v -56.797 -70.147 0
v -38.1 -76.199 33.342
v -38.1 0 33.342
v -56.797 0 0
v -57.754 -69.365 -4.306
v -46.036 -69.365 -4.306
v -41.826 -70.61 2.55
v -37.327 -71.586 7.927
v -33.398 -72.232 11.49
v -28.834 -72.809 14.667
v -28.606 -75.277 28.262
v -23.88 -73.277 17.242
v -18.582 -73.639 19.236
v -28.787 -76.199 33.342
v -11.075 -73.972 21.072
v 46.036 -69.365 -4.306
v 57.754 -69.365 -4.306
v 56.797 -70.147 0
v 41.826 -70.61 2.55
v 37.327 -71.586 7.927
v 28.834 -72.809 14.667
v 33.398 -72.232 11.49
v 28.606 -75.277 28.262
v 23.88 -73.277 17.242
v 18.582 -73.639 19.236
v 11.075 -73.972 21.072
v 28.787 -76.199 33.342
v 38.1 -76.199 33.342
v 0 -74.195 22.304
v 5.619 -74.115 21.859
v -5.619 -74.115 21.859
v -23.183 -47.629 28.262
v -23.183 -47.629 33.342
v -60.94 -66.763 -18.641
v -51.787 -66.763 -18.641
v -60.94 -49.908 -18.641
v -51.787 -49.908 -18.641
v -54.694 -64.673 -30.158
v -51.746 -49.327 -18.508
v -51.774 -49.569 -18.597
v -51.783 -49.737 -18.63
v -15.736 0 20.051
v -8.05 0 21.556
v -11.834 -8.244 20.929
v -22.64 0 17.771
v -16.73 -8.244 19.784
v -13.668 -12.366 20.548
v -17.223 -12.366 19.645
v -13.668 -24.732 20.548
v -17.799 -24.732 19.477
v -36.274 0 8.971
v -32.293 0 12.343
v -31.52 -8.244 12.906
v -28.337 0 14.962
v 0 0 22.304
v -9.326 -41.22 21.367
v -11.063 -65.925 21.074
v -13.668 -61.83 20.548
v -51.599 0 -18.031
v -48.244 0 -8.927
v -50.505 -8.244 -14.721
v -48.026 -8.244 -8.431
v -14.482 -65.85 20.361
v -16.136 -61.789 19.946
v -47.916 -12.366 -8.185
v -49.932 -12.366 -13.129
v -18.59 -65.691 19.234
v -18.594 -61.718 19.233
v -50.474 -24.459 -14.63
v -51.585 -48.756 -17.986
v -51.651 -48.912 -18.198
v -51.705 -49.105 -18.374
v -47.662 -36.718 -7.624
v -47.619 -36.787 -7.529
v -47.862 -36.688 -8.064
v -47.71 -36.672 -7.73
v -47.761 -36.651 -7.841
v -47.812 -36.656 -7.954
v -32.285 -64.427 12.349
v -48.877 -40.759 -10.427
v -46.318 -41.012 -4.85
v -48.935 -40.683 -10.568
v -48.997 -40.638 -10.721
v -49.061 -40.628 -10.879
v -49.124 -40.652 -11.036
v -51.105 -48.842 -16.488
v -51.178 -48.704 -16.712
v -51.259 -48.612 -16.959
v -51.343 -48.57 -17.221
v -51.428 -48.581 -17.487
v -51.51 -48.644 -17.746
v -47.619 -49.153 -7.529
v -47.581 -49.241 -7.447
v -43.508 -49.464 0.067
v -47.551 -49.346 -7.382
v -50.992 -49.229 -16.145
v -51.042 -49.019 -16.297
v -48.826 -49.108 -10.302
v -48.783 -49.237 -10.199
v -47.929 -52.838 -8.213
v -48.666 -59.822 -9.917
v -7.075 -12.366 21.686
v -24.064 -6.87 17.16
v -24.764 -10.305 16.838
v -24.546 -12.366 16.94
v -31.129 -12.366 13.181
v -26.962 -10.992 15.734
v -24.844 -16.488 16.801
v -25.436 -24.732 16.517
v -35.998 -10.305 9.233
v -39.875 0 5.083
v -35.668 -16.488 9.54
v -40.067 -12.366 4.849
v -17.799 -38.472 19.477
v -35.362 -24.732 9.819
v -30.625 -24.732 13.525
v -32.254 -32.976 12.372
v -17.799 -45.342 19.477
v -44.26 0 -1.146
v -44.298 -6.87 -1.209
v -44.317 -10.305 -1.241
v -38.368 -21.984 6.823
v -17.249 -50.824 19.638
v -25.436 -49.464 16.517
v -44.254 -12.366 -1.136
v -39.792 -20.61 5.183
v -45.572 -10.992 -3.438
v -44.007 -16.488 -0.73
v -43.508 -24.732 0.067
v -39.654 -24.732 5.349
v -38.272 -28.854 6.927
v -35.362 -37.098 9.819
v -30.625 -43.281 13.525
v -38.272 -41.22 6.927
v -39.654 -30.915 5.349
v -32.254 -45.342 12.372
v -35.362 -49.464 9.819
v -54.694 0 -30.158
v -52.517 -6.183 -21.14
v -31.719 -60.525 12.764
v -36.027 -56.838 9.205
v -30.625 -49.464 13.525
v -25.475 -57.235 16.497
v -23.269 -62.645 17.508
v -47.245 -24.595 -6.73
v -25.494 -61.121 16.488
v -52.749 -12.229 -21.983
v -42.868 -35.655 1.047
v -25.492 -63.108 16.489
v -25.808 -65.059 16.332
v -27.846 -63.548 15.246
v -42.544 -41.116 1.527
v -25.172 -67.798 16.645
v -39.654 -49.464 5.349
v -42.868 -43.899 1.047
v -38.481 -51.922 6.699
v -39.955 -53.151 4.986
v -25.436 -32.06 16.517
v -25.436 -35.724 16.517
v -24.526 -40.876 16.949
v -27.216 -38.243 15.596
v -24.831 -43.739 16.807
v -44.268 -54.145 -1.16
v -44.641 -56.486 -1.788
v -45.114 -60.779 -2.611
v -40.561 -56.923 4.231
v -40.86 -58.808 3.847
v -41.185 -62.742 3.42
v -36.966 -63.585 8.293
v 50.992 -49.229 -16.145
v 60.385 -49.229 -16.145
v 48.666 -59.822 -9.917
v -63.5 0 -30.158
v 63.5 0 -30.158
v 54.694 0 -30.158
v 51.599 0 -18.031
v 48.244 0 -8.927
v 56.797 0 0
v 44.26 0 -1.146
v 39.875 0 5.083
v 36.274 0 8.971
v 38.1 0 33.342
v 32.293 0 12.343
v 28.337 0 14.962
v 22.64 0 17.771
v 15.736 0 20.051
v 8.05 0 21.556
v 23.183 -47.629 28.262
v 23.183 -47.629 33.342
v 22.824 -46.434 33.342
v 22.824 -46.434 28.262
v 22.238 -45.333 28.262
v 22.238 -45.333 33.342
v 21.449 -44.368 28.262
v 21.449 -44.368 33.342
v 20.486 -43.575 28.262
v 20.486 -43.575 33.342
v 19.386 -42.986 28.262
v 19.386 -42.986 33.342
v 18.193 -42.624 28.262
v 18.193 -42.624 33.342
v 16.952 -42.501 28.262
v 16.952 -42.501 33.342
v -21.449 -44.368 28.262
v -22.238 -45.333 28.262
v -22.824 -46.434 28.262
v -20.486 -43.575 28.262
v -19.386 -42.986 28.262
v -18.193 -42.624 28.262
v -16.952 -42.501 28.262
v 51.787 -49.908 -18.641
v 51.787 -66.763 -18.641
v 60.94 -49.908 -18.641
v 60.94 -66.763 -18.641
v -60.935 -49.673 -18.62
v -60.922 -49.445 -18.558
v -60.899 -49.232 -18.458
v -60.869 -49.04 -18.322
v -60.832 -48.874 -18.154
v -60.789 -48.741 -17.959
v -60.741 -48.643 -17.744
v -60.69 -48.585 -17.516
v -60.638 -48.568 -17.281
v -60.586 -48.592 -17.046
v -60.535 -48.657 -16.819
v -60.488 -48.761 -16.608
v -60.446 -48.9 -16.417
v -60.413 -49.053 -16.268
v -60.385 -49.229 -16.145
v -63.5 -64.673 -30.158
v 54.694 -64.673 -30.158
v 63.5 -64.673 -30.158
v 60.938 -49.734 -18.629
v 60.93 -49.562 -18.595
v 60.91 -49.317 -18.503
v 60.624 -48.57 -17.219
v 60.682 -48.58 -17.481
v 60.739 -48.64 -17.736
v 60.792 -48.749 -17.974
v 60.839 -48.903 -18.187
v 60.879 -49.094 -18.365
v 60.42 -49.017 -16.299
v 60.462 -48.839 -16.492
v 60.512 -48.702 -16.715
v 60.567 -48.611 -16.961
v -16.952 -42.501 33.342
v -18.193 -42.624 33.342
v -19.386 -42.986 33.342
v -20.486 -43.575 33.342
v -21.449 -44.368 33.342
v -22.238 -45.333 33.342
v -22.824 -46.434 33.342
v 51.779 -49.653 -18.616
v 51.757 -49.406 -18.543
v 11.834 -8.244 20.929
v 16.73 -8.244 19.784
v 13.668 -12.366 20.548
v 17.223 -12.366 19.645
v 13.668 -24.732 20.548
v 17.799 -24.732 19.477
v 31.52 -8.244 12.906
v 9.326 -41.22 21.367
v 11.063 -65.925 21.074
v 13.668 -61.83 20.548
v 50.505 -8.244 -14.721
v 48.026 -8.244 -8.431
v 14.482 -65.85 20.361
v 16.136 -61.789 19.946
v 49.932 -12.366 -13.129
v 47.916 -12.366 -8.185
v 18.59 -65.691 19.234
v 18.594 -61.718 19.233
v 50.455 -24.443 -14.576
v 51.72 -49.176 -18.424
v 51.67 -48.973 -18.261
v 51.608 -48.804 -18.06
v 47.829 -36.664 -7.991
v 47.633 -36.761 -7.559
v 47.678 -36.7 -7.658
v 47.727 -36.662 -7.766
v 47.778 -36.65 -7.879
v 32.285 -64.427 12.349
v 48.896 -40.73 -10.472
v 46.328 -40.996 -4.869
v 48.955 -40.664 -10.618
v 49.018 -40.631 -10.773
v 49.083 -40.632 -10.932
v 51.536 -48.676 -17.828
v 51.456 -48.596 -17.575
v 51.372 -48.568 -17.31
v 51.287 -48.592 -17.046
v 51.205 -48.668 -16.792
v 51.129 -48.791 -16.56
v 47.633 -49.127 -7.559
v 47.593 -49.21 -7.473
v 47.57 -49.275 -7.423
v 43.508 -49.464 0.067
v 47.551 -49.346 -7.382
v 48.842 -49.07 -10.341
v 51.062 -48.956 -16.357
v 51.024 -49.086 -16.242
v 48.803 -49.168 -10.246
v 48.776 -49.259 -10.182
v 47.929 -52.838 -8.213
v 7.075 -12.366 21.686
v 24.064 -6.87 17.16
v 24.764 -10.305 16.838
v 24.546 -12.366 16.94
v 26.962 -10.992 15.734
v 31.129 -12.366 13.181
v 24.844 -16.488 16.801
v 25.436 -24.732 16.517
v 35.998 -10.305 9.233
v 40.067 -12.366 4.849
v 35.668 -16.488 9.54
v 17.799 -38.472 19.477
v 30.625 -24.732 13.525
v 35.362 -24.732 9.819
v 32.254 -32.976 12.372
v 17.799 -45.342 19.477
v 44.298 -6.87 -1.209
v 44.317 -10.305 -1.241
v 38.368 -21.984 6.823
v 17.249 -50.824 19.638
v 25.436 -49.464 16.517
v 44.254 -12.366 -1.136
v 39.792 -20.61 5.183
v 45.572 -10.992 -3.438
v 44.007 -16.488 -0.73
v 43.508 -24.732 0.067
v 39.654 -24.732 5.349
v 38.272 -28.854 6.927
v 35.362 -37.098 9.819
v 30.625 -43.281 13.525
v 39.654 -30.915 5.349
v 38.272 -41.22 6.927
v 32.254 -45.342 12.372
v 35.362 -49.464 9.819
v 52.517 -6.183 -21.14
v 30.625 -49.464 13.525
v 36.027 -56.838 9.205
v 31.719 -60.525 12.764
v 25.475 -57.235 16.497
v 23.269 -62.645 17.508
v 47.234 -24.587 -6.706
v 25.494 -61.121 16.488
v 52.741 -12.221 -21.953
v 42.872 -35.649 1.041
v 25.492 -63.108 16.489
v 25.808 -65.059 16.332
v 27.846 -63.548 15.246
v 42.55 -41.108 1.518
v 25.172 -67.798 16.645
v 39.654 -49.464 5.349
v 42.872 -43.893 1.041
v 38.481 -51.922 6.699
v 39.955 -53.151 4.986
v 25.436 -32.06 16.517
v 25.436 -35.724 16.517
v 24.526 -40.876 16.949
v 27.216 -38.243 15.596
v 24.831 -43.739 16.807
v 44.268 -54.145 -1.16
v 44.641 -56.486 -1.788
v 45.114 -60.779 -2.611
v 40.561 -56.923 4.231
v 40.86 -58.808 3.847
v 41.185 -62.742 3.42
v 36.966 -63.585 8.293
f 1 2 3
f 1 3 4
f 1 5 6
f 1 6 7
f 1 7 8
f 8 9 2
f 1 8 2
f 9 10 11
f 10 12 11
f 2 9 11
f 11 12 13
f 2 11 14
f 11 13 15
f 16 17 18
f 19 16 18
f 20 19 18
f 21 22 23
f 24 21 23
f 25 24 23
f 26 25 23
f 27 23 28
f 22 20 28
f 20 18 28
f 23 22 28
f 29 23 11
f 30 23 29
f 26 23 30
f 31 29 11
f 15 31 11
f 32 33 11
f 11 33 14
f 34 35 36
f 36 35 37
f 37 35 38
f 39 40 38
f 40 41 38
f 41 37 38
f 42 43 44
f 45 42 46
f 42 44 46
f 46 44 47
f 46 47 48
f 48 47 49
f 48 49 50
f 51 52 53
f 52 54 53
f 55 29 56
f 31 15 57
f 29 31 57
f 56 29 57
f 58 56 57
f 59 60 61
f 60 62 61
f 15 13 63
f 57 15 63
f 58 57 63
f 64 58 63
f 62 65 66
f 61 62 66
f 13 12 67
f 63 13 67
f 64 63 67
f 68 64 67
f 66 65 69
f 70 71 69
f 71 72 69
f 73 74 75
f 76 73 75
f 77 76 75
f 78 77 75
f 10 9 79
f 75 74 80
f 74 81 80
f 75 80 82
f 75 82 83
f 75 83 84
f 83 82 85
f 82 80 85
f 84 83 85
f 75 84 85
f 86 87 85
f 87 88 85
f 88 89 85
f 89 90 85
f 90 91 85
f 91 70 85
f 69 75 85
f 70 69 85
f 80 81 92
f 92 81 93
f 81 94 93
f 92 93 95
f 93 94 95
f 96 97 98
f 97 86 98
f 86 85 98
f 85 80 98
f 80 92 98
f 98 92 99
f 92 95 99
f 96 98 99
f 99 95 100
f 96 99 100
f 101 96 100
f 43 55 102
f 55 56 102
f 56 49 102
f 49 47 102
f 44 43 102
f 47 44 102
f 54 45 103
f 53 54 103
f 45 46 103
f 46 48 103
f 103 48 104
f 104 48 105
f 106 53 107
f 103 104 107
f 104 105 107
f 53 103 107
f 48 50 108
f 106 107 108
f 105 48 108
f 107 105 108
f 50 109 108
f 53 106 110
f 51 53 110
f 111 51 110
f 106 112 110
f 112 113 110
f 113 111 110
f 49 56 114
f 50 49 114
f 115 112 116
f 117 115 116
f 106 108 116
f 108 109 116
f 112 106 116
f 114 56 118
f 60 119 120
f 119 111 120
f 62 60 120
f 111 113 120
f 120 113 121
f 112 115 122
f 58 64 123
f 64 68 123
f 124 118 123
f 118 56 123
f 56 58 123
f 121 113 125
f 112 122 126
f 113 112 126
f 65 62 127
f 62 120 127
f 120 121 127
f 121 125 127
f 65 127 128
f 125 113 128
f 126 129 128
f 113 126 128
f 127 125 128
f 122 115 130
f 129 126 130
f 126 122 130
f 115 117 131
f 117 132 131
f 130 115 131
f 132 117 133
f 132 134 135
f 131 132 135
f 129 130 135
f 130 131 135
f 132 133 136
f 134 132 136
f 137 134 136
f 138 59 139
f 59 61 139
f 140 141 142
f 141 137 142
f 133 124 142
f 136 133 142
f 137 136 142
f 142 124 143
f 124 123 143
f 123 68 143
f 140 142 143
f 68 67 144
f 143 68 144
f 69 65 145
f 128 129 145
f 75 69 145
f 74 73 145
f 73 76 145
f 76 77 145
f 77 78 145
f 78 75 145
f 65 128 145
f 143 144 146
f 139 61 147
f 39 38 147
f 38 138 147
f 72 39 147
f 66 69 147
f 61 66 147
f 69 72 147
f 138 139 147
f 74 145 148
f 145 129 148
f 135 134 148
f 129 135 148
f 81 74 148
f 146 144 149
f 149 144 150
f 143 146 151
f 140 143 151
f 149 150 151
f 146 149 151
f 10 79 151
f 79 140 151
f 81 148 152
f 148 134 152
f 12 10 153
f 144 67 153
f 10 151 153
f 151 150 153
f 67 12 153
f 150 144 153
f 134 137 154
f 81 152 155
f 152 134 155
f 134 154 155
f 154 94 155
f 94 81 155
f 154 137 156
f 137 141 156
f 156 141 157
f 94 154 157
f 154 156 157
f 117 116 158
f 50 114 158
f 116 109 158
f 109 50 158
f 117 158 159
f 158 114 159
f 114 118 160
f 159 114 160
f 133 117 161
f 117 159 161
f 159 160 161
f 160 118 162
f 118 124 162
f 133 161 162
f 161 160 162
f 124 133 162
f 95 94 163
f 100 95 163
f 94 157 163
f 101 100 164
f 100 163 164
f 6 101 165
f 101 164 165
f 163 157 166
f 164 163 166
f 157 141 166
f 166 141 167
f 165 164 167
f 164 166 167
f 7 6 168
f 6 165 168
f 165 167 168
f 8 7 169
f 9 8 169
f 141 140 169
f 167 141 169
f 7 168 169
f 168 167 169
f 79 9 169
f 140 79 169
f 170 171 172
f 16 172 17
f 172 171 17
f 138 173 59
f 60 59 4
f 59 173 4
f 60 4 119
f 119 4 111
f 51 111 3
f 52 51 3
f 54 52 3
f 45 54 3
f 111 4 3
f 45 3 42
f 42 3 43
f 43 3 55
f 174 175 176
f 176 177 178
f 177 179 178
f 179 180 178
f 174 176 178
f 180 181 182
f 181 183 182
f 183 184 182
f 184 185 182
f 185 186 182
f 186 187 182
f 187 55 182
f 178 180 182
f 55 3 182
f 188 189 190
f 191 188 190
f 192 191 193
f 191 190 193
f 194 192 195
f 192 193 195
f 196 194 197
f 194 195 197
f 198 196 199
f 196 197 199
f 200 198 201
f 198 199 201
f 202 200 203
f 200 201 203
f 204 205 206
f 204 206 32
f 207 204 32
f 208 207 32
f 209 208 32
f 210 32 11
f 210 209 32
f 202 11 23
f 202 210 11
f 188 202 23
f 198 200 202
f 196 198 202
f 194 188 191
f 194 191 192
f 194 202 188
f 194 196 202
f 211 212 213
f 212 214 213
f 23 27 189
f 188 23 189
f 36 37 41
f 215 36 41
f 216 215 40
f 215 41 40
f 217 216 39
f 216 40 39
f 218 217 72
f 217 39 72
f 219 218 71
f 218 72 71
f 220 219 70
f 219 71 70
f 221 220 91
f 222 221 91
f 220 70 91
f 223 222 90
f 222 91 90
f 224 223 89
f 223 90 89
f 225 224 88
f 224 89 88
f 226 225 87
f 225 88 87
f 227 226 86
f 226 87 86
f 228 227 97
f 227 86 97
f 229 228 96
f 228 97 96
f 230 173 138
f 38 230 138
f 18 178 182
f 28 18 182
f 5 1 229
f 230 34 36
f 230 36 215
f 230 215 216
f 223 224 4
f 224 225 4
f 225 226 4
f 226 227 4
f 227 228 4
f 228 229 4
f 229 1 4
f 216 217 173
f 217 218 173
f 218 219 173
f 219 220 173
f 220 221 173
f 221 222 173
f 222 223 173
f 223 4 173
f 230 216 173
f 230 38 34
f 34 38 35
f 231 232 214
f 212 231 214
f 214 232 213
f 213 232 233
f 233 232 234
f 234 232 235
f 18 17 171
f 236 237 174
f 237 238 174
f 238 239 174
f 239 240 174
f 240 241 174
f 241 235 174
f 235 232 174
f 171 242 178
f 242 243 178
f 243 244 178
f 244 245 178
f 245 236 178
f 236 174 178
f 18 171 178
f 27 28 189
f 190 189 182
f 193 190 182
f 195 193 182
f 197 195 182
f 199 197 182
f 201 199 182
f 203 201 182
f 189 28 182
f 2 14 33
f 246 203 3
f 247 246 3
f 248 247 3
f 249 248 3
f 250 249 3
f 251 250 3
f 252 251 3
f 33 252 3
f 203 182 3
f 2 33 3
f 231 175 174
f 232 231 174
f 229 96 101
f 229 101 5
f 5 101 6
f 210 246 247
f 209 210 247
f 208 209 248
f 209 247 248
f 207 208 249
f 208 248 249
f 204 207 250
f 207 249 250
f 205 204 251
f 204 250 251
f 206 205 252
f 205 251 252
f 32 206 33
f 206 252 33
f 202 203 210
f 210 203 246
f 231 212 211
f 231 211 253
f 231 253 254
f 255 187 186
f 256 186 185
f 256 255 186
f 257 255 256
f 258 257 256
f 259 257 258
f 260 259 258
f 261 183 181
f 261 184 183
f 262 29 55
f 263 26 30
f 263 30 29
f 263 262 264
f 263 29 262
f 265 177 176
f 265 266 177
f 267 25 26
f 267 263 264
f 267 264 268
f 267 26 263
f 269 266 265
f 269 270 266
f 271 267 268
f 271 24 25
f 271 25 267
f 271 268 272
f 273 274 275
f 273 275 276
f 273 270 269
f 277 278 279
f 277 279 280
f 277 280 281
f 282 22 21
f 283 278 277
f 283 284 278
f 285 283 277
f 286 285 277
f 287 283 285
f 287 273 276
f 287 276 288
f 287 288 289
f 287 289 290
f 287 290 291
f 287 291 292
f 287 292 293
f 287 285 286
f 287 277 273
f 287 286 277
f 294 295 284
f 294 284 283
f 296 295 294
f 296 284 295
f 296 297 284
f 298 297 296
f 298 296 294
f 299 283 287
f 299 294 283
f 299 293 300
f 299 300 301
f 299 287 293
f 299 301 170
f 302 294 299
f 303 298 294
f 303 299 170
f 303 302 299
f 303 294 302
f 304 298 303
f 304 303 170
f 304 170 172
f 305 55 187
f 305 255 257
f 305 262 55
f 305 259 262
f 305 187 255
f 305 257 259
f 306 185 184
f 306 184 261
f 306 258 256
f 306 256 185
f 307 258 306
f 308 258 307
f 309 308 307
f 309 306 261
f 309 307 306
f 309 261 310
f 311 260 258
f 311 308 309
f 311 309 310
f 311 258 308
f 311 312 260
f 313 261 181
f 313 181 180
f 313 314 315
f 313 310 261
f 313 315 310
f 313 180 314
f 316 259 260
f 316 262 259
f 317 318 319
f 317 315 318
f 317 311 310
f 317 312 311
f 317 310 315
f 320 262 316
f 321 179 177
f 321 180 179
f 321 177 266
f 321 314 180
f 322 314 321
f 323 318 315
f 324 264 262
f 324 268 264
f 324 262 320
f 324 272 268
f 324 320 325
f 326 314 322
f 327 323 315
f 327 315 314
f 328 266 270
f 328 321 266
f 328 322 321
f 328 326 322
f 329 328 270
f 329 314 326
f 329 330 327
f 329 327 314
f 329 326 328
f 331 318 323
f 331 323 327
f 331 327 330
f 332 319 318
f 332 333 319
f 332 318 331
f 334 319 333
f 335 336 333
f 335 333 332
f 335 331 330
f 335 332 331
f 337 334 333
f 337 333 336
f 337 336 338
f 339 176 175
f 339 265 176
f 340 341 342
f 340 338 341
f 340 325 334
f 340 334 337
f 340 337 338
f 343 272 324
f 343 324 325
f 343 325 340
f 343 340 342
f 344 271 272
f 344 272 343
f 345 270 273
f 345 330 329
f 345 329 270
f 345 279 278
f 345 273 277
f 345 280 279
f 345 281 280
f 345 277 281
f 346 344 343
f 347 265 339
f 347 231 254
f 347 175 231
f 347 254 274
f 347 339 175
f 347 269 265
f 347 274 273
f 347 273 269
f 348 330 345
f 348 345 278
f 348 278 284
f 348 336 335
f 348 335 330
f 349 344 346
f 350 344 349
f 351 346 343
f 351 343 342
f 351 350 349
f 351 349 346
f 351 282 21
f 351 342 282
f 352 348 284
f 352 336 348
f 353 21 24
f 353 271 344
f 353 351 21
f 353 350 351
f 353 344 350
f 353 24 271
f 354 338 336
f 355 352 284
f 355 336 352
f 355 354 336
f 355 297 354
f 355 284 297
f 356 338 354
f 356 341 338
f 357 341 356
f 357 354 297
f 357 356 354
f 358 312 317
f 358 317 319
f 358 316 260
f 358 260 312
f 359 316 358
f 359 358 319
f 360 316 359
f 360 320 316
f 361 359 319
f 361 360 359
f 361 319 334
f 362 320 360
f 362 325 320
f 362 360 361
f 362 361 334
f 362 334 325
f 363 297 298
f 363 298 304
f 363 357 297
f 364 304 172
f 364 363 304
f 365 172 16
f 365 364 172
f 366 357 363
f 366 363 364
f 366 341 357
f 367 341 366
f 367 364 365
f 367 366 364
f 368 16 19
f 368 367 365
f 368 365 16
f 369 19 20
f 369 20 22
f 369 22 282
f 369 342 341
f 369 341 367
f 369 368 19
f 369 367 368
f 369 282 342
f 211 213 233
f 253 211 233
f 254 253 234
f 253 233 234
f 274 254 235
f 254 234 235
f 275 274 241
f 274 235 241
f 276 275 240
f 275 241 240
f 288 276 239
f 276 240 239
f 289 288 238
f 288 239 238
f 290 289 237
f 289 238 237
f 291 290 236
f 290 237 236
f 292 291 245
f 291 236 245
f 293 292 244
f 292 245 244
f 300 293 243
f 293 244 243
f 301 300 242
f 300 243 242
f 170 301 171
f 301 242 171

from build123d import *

# Parameters (mm, degrees)
F1_DEPTH = 76.2
F3_DEPTH = 115.062
F5_DEPTH = 5.08
F7_DEPTH = 101.6
F9_DEPTH = 101.6


with BuildPart() as f1:
    # F0 (on Front) → F1 (new body)
    with BuildSketch(Plane.XZ):
        Polygon((38.1, 33.34175663), (0, 33.34175663), (-38.1, 33.34175663), (-56.7968450487, 0), (-63.5, -30.15824337), (0, -30.15824337), (63.5, -30.15824337), (56.7968450487, 0), align=None)
    extrude(amount=F1_DEPTH)

    # F2 (on face) → F3 (cut)
    with BuildSketch(Plane.XZ.offset(76.2)):
        with BuildLine():
            add(Edge.make_bspline(
                [(0, 22.3041530699), (29.2770247906, 20.8090394735), (46.7912144959, 7.9937791452), (54.6939596534, -30.15824337)],
                knots=[0, 0, 0, 0, 75.7874149366, 75.7874149366, 75.7874149366, 75.7874149366], degree=3))
            add(Edge.make_bspline(
                [(0, 22.3041530699), (-29.2770247906, 20.8090394735), (-46.7912144959, 7.9937791452), (-54.6939596534, -30.15824337)],
                knots=[0, 0, 0, 0, 75.7874149366, 75.7874149366, 75.7874149366, 75.7874149366], degree=3))
            Line((-54.6939596534, -30.15824337), (54.6939596534, -30.15824337))
        make_face()
    extrude(amount=-F3_DEPTH, mode=Mode.SUBTRACT)

    # F4 (on face) → F5 (cut)
    with BuildSketch(Plane.XY.offset(33.34175663)):
        with BuildLine():
            Line((-23.1831711448, -47.6289144868), (-28.7870969623, -76.2))
            Line((-28.7870969623, -76.2), (28.7870969623, -76.2))
            Line((28.7870969623, -76.2), (23.1831711448, -47.6289144868))
            ThreePointArc((23.1831711448, -47.6289144868), (20.9868440702, -43.9478771705), (16.9519010018, -42.5011143088))
            Line((16.9519010018, -42.5011143088), (0, -42.5011143088))
            Line((0, -42.5011143088), (-16.9519010018, -42.5011143088))
            ThreePointArc((-16.9519010018, -42.5011143088), (-20.9868440702, -43.9478771705), (-23.1831711448, -47.6289144868))
        make_face()
    extrude(amount=-F5_DEPTH, mode=Mode.SUBTRACT)

    # F6 (on Right) → F7 (cut, symmetric)
    with BuildSketch(Plane.YZ):
        with BuildLine():
            Line((-80.7253196836, 2.3729712702), (-78.2108455896, -18.6408273876))
            Line((-78.2108455896, -18.6408273876), (-49.9080079385, -18.6408273876))
            ThreePointArc((-49.9080079385, -18.6408273876), (-48.6147643972, -17.6525414948), (-49.2287055162, -16.1451383751))
            Line((-49.2287055162, -16.1451383751), (-80.7253196836, 2.3729712702))
        make_face()
    extrude(amount=F7_DEPTH, both=True, mode=Mode.SUBTRACT)

    # F8 (on Right) → F9 (cut, symmetric)
    with BuildSketch(Plane.YZ):
        Polygon((-85.8533158898, -35.2425277233), (-63.5725855827, -36.2190529704), (-76.2457847595, 33.6000360548), align=None)
    extrude(amount=F9_DEPTH, both=True, mode=Mode.SUBTRACT)


solid = f1.part
